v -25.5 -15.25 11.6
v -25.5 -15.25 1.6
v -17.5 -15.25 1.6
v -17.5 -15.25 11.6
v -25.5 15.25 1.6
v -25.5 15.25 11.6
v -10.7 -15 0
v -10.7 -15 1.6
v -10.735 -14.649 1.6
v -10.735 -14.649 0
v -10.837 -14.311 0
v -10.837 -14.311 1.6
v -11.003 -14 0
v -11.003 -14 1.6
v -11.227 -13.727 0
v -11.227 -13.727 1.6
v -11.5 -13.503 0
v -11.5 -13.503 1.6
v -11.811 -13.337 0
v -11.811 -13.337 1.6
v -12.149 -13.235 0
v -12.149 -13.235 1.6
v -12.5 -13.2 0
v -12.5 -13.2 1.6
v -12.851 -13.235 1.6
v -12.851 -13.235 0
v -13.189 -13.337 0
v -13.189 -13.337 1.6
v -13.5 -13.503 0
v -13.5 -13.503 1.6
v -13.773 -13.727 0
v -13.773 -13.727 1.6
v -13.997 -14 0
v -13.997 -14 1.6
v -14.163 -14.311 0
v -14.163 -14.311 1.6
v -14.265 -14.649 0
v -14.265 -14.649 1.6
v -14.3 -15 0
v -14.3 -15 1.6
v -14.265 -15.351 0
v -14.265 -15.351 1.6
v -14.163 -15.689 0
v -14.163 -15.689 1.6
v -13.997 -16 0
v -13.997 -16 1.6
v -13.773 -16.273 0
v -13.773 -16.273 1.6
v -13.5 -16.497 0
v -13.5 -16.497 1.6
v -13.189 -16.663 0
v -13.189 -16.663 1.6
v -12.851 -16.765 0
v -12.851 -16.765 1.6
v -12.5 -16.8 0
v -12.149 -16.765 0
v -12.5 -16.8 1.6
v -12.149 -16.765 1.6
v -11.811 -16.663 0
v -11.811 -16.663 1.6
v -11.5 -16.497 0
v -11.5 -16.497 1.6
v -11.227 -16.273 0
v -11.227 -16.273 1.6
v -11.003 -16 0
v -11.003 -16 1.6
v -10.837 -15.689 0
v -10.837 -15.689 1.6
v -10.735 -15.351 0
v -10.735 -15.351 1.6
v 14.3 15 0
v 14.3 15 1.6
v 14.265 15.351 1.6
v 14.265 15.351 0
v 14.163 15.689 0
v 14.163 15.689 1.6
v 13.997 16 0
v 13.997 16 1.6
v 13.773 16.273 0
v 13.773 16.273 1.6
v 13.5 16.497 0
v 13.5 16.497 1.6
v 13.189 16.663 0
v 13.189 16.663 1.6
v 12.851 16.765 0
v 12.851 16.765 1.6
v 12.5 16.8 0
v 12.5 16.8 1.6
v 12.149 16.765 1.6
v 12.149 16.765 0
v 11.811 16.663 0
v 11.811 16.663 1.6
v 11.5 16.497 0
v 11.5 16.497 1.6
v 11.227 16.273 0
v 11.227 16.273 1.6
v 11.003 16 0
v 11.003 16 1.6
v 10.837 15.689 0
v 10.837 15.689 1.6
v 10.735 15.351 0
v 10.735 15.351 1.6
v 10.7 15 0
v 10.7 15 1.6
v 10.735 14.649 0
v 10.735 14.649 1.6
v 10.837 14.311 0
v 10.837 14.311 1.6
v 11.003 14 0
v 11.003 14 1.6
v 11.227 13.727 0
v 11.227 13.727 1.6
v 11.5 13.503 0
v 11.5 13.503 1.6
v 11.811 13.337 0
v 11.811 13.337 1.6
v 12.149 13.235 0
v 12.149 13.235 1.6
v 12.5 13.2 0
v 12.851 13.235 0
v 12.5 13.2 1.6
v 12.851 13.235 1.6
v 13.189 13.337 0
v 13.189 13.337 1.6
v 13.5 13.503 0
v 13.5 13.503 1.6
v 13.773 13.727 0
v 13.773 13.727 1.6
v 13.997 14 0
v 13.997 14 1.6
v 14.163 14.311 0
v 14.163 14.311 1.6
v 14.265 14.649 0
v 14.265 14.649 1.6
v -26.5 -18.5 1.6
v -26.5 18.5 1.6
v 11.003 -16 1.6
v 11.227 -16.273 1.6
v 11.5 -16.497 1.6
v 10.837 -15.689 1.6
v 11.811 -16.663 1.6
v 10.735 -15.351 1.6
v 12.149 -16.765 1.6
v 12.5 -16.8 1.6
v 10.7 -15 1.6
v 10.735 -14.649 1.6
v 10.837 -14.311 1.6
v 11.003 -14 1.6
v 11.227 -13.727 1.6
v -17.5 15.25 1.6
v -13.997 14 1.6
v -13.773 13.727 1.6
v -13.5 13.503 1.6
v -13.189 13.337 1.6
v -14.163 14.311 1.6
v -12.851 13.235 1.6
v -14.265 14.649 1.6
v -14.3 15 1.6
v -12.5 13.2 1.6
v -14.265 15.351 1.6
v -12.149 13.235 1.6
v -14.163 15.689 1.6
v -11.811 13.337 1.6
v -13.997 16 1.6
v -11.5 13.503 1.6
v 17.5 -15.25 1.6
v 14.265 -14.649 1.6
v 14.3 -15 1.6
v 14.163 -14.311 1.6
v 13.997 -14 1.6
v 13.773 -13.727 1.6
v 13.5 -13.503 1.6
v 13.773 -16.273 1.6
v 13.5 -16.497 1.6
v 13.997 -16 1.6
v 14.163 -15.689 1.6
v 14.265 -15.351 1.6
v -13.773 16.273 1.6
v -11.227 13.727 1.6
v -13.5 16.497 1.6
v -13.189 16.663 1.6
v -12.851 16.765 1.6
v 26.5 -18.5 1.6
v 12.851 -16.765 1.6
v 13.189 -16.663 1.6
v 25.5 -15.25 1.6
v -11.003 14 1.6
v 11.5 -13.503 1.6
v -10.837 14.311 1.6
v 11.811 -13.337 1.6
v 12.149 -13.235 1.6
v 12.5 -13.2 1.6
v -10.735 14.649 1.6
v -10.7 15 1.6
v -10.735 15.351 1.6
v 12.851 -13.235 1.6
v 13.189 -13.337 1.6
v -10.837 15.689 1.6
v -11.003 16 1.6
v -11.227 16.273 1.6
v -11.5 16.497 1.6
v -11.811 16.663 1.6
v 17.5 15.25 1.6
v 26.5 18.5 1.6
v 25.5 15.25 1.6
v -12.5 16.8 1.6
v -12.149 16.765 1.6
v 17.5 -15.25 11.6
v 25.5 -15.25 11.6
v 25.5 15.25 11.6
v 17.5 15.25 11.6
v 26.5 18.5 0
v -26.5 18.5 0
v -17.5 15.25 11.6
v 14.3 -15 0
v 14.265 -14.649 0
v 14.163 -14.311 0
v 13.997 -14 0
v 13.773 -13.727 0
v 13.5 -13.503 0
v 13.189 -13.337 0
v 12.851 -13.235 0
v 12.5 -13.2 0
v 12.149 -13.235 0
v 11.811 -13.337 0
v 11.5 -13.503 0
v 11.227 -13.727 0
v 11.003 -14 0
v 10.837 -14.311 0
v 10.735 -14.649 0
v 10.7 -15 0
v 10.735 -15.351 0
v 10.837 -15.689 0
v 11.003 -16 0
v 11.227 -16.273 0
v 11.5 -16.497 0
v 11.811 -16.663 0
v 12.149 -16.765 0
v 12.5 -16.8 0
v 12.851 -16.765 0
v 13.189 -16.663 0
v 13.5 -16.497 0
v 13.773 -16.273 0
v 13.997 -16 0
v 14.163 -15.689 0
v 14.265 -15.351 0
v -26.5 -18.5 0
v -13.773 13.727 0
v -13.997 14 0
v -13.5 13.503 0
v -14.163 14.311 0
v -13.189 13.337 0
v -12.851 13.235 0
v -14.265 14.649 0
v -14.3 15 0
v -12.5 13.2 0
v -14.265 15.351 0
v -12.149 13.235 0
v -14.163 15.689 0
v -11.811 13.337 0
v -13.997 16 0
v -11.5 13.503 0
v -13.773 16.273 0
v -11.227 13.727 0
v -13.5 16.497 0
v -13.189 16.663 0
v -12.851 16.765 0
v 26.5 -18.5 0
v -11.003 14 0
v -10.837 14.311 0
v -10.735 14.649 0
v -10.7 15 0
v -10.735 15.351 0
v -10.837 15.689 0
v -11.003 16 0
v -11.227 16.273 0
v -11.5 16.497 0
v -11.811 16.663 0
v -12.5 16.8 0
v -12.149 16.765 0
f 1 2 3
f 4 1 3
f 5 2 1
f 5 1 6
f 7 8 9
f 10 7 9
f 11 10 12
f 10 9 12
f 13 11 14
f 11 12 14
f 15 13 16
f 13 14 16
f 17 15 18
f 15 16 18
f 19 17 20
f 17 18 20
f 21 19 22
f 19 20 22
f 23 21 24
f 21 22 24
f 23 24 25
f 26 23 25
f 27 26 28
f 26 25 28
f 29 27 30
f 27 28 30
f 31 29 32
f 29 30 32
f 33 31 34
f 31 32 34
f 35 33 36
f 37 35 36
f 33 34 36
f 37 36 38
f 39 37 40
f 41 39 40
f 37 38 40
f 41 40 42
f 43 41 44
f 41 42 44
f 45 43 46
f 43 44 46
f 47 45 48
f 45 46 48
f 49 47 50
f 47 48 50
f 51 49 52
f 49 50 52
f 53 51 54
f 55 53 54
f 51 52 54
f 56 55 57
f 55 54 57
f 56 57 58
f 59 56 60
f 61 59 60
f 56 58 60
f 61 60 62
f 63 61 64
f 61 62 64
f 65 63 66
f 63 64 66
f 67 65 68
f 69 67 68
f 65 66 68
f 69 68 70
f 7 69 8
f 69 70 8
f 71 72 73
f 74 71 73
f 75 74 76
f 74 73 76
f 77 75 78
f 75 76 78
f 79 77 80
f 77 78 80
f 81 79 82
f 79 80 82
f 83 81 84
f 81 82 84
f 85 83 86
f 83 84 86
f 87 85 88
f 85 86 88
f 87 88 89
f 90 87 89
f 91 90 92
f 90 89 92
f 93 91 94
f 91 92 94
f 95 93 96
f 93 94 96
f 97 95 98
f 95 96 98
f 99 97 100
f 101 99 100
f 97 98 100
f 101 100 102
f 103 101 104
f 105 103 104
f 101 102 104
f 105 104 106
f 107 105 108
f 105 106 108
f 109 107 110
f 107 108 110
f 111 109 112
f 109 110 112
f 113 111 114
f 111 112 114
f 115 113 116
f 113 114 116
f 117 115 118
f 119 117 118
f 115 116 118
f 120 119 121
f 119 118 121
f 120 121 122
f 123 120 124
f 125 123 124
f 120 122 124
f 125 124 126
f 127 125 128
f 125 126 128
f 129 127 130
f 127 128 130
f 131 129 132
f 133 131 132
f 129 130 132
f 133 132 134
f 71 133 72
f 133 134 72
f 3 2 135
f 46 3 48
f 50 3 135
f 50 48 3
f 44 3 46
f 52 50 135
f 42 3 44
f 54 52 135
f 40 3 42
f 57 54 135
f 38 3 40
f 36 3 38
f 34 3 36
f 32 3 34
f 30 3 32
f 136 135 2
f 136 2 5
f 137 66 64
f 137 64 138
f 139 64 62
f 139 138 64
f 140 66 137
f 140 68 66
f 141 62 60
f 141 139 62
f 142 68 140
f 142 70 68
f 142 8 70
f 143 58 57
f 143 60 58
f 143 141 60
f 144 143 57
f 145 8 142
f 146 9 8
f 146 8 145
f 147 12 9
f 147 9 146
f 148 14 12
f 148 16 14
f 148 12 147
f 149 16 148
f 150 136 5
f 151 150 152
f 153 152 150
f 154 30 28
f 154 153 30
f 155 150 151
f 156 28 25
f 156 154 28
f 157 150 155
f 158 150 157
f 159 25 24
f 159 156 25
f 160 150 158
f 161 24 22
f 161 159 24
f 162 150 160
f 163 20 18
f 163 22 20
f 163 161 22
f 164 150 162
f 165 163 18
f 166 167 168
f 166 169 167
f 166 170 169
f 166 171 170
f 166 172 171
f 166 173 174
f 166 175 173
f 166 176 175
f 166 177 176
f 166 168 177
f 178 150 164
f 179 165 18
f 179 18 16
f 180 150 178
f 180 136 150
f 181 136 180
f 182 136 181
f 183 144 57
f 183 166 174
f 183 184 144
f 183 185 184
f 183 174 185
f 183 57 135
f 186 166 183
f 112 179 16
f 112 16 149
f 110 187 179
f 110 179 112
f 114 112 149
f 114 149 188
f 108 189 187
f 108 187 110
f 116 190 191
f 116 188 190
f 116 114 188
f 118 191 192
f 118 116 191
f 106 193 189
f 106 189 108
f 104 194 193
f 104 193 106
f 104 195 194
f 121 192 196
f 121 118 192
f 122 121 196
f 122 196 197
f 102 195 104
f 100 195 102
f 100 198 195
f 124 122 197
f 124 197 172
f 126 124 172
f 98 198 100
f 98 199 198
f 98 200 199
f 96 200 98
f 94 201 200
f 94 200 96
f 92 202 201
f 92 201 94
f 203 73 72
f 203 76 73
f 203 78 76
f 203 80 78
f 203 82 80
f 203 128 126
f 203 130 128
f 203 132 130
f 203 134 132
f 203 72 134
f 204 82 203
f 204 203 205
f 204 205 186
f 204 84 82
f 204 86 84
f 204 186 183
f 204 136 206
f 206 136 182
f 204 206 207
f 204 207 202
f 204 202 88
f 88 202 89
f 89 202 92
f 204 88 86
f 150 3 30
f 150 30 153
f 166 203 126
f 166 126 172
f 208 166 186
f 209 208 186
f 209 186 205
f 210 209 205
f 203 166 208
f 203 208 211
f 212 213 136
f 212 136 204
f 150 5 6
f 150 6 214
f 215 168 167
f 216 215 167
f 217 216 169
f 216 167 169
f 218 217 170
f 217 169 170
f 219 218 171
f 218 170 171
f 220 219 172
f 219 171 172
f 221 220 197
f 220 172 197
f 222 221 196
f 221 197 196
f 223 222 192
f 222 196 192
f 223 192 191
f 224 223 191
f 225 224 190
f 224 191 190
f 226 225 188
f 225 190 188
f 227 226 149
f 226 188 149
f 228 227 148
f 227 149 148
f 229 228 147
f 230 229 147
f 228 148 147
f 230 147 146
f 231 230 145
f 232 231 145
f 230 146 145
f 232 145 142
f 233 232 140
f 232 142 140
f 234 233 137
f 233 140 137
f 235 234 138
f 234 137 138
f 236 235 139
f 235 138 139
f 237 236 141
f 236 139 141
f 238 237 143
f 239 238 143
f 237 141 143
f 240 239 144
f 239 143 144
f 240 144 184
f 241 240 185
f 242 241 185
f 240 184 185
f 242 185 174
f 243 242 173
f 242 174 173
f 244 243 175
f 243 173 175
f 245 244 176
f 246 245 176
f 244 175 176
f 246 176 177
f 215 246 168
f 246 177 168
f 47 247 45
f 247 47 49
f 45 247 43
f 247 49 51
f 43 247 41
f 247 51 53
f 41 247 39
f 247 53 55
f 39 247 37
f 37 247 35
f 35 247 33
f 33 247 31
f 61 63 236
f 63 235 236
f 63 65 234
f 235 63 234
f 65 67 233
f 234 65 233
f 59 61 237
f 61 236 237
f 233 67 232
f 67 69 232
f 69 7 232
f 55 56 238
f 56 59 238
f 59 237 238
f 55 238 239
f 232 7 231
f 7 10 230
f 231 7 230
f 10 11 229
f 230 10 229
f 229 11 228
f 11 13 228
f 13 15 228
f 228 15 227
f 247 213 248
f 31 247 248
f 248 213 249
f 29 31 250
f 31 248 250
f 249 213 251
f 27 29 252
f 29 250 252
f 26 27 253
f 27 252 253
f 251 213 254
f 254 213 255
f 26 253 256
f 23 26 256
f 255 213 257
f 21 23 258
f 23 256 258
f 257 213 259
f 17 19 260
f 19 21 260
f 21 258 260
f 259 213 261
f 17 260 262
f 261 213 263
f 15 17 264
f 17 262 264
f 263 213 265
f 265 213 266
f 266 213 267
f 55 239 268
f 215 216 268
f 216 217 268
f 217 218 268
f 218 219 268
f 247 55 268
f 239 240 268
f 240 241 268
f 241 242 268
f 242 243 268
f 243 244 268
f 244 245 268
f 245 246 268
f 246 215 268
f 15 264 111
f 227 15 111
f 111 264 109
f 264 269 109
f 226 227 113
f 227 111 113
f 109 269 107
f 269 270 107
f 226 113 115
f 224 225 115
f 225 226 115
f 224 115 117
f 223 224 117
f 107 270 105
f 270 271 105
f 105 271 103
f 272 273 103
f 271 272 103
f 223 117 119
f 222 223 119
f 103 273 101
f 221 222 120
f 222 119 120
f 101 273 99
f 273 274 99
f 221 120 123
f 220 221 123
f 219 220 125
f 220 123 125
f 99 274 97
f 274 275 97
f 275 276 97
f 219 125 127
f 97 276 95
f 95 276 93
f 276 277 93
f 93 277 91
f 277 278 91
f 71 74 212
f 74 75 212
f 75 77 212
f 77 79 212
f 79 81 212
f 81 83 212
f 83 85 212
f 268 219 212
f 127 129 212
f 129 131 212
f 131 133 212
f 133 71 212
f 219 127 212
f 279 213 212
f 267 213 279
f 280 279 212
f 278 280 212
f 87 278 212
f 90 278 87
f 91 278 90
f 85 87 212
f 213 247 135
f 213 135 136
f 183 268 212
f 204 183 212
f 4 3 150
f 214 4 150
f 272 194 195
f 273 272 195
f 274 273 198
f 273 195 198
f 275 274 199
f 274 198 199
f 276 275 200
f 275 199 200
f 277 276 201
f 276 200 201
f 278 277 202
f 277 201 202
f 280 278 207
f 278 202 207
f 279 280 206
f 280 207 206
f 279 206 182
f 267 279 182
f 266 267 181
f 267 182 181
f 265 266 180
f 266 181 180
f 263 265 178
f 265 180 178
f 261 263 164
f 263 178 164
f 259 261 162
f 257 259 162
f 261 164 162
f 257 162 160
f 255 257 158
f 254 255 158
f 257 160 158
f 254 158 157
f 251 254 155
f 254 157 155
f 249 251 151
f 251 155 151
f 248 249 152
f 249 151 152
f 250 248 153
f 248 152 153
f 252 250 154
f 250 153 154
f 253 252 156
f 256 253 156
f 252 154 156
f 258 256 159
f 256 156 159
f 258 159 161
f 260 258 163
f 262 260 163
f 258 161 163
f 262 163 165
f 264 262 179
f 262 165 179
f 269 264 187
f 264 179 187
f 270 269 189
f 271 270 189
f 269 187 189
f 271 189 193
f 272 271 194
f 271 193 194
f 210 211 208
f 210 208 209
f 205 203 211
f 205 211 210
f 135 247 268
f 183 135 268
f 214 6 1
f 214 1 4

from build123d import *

# Parameters (mm, degrees)
F0_W     = 53
F0_H     = 37
F1_DEPTH = 1.6
F2_W     = 8
F2_H     = 30.5
F3_DEPTH = 10
F4_R     = 1.8
F5_DEPTH = 1.6


with BuildPart() as f1:
    # F0 (on Top) → F1 (new body)
    with BuildSketch(Plane.XY):
        Rectangle(F0_W, F0_H)
    extrude(amount=F1_DEPTH)

    # F2 (on face) → F3 (join)
    with BuildSketch(Plane.XY.offset(1.6)):
        with Locations((21.5, 0)):
            Rectangle(F2_W, F2_H)
        with Locations((-21.5, 0)):
            Rectangle(F2_W, F2_H)
    extrude(amount=F3_DEPTH)

    # F4 (on face) → F5 (cut, through all)
    with BuildSketch(Plane.XY.offset(1.6)):
        with Locations((12.5, -15)):
            Circle(F4_R)
        with Locations((12.5, 15)):
            Circle(F4_R)
        with Locations((-12.5, 15)):
            Circle(F4_R)
        with Locations((-12.5, -15)):
            Circle(F4_R)
    extrude(amount=-F5_DEPTH, mode=Mode.SUBTRACT)


solid = f1.part
